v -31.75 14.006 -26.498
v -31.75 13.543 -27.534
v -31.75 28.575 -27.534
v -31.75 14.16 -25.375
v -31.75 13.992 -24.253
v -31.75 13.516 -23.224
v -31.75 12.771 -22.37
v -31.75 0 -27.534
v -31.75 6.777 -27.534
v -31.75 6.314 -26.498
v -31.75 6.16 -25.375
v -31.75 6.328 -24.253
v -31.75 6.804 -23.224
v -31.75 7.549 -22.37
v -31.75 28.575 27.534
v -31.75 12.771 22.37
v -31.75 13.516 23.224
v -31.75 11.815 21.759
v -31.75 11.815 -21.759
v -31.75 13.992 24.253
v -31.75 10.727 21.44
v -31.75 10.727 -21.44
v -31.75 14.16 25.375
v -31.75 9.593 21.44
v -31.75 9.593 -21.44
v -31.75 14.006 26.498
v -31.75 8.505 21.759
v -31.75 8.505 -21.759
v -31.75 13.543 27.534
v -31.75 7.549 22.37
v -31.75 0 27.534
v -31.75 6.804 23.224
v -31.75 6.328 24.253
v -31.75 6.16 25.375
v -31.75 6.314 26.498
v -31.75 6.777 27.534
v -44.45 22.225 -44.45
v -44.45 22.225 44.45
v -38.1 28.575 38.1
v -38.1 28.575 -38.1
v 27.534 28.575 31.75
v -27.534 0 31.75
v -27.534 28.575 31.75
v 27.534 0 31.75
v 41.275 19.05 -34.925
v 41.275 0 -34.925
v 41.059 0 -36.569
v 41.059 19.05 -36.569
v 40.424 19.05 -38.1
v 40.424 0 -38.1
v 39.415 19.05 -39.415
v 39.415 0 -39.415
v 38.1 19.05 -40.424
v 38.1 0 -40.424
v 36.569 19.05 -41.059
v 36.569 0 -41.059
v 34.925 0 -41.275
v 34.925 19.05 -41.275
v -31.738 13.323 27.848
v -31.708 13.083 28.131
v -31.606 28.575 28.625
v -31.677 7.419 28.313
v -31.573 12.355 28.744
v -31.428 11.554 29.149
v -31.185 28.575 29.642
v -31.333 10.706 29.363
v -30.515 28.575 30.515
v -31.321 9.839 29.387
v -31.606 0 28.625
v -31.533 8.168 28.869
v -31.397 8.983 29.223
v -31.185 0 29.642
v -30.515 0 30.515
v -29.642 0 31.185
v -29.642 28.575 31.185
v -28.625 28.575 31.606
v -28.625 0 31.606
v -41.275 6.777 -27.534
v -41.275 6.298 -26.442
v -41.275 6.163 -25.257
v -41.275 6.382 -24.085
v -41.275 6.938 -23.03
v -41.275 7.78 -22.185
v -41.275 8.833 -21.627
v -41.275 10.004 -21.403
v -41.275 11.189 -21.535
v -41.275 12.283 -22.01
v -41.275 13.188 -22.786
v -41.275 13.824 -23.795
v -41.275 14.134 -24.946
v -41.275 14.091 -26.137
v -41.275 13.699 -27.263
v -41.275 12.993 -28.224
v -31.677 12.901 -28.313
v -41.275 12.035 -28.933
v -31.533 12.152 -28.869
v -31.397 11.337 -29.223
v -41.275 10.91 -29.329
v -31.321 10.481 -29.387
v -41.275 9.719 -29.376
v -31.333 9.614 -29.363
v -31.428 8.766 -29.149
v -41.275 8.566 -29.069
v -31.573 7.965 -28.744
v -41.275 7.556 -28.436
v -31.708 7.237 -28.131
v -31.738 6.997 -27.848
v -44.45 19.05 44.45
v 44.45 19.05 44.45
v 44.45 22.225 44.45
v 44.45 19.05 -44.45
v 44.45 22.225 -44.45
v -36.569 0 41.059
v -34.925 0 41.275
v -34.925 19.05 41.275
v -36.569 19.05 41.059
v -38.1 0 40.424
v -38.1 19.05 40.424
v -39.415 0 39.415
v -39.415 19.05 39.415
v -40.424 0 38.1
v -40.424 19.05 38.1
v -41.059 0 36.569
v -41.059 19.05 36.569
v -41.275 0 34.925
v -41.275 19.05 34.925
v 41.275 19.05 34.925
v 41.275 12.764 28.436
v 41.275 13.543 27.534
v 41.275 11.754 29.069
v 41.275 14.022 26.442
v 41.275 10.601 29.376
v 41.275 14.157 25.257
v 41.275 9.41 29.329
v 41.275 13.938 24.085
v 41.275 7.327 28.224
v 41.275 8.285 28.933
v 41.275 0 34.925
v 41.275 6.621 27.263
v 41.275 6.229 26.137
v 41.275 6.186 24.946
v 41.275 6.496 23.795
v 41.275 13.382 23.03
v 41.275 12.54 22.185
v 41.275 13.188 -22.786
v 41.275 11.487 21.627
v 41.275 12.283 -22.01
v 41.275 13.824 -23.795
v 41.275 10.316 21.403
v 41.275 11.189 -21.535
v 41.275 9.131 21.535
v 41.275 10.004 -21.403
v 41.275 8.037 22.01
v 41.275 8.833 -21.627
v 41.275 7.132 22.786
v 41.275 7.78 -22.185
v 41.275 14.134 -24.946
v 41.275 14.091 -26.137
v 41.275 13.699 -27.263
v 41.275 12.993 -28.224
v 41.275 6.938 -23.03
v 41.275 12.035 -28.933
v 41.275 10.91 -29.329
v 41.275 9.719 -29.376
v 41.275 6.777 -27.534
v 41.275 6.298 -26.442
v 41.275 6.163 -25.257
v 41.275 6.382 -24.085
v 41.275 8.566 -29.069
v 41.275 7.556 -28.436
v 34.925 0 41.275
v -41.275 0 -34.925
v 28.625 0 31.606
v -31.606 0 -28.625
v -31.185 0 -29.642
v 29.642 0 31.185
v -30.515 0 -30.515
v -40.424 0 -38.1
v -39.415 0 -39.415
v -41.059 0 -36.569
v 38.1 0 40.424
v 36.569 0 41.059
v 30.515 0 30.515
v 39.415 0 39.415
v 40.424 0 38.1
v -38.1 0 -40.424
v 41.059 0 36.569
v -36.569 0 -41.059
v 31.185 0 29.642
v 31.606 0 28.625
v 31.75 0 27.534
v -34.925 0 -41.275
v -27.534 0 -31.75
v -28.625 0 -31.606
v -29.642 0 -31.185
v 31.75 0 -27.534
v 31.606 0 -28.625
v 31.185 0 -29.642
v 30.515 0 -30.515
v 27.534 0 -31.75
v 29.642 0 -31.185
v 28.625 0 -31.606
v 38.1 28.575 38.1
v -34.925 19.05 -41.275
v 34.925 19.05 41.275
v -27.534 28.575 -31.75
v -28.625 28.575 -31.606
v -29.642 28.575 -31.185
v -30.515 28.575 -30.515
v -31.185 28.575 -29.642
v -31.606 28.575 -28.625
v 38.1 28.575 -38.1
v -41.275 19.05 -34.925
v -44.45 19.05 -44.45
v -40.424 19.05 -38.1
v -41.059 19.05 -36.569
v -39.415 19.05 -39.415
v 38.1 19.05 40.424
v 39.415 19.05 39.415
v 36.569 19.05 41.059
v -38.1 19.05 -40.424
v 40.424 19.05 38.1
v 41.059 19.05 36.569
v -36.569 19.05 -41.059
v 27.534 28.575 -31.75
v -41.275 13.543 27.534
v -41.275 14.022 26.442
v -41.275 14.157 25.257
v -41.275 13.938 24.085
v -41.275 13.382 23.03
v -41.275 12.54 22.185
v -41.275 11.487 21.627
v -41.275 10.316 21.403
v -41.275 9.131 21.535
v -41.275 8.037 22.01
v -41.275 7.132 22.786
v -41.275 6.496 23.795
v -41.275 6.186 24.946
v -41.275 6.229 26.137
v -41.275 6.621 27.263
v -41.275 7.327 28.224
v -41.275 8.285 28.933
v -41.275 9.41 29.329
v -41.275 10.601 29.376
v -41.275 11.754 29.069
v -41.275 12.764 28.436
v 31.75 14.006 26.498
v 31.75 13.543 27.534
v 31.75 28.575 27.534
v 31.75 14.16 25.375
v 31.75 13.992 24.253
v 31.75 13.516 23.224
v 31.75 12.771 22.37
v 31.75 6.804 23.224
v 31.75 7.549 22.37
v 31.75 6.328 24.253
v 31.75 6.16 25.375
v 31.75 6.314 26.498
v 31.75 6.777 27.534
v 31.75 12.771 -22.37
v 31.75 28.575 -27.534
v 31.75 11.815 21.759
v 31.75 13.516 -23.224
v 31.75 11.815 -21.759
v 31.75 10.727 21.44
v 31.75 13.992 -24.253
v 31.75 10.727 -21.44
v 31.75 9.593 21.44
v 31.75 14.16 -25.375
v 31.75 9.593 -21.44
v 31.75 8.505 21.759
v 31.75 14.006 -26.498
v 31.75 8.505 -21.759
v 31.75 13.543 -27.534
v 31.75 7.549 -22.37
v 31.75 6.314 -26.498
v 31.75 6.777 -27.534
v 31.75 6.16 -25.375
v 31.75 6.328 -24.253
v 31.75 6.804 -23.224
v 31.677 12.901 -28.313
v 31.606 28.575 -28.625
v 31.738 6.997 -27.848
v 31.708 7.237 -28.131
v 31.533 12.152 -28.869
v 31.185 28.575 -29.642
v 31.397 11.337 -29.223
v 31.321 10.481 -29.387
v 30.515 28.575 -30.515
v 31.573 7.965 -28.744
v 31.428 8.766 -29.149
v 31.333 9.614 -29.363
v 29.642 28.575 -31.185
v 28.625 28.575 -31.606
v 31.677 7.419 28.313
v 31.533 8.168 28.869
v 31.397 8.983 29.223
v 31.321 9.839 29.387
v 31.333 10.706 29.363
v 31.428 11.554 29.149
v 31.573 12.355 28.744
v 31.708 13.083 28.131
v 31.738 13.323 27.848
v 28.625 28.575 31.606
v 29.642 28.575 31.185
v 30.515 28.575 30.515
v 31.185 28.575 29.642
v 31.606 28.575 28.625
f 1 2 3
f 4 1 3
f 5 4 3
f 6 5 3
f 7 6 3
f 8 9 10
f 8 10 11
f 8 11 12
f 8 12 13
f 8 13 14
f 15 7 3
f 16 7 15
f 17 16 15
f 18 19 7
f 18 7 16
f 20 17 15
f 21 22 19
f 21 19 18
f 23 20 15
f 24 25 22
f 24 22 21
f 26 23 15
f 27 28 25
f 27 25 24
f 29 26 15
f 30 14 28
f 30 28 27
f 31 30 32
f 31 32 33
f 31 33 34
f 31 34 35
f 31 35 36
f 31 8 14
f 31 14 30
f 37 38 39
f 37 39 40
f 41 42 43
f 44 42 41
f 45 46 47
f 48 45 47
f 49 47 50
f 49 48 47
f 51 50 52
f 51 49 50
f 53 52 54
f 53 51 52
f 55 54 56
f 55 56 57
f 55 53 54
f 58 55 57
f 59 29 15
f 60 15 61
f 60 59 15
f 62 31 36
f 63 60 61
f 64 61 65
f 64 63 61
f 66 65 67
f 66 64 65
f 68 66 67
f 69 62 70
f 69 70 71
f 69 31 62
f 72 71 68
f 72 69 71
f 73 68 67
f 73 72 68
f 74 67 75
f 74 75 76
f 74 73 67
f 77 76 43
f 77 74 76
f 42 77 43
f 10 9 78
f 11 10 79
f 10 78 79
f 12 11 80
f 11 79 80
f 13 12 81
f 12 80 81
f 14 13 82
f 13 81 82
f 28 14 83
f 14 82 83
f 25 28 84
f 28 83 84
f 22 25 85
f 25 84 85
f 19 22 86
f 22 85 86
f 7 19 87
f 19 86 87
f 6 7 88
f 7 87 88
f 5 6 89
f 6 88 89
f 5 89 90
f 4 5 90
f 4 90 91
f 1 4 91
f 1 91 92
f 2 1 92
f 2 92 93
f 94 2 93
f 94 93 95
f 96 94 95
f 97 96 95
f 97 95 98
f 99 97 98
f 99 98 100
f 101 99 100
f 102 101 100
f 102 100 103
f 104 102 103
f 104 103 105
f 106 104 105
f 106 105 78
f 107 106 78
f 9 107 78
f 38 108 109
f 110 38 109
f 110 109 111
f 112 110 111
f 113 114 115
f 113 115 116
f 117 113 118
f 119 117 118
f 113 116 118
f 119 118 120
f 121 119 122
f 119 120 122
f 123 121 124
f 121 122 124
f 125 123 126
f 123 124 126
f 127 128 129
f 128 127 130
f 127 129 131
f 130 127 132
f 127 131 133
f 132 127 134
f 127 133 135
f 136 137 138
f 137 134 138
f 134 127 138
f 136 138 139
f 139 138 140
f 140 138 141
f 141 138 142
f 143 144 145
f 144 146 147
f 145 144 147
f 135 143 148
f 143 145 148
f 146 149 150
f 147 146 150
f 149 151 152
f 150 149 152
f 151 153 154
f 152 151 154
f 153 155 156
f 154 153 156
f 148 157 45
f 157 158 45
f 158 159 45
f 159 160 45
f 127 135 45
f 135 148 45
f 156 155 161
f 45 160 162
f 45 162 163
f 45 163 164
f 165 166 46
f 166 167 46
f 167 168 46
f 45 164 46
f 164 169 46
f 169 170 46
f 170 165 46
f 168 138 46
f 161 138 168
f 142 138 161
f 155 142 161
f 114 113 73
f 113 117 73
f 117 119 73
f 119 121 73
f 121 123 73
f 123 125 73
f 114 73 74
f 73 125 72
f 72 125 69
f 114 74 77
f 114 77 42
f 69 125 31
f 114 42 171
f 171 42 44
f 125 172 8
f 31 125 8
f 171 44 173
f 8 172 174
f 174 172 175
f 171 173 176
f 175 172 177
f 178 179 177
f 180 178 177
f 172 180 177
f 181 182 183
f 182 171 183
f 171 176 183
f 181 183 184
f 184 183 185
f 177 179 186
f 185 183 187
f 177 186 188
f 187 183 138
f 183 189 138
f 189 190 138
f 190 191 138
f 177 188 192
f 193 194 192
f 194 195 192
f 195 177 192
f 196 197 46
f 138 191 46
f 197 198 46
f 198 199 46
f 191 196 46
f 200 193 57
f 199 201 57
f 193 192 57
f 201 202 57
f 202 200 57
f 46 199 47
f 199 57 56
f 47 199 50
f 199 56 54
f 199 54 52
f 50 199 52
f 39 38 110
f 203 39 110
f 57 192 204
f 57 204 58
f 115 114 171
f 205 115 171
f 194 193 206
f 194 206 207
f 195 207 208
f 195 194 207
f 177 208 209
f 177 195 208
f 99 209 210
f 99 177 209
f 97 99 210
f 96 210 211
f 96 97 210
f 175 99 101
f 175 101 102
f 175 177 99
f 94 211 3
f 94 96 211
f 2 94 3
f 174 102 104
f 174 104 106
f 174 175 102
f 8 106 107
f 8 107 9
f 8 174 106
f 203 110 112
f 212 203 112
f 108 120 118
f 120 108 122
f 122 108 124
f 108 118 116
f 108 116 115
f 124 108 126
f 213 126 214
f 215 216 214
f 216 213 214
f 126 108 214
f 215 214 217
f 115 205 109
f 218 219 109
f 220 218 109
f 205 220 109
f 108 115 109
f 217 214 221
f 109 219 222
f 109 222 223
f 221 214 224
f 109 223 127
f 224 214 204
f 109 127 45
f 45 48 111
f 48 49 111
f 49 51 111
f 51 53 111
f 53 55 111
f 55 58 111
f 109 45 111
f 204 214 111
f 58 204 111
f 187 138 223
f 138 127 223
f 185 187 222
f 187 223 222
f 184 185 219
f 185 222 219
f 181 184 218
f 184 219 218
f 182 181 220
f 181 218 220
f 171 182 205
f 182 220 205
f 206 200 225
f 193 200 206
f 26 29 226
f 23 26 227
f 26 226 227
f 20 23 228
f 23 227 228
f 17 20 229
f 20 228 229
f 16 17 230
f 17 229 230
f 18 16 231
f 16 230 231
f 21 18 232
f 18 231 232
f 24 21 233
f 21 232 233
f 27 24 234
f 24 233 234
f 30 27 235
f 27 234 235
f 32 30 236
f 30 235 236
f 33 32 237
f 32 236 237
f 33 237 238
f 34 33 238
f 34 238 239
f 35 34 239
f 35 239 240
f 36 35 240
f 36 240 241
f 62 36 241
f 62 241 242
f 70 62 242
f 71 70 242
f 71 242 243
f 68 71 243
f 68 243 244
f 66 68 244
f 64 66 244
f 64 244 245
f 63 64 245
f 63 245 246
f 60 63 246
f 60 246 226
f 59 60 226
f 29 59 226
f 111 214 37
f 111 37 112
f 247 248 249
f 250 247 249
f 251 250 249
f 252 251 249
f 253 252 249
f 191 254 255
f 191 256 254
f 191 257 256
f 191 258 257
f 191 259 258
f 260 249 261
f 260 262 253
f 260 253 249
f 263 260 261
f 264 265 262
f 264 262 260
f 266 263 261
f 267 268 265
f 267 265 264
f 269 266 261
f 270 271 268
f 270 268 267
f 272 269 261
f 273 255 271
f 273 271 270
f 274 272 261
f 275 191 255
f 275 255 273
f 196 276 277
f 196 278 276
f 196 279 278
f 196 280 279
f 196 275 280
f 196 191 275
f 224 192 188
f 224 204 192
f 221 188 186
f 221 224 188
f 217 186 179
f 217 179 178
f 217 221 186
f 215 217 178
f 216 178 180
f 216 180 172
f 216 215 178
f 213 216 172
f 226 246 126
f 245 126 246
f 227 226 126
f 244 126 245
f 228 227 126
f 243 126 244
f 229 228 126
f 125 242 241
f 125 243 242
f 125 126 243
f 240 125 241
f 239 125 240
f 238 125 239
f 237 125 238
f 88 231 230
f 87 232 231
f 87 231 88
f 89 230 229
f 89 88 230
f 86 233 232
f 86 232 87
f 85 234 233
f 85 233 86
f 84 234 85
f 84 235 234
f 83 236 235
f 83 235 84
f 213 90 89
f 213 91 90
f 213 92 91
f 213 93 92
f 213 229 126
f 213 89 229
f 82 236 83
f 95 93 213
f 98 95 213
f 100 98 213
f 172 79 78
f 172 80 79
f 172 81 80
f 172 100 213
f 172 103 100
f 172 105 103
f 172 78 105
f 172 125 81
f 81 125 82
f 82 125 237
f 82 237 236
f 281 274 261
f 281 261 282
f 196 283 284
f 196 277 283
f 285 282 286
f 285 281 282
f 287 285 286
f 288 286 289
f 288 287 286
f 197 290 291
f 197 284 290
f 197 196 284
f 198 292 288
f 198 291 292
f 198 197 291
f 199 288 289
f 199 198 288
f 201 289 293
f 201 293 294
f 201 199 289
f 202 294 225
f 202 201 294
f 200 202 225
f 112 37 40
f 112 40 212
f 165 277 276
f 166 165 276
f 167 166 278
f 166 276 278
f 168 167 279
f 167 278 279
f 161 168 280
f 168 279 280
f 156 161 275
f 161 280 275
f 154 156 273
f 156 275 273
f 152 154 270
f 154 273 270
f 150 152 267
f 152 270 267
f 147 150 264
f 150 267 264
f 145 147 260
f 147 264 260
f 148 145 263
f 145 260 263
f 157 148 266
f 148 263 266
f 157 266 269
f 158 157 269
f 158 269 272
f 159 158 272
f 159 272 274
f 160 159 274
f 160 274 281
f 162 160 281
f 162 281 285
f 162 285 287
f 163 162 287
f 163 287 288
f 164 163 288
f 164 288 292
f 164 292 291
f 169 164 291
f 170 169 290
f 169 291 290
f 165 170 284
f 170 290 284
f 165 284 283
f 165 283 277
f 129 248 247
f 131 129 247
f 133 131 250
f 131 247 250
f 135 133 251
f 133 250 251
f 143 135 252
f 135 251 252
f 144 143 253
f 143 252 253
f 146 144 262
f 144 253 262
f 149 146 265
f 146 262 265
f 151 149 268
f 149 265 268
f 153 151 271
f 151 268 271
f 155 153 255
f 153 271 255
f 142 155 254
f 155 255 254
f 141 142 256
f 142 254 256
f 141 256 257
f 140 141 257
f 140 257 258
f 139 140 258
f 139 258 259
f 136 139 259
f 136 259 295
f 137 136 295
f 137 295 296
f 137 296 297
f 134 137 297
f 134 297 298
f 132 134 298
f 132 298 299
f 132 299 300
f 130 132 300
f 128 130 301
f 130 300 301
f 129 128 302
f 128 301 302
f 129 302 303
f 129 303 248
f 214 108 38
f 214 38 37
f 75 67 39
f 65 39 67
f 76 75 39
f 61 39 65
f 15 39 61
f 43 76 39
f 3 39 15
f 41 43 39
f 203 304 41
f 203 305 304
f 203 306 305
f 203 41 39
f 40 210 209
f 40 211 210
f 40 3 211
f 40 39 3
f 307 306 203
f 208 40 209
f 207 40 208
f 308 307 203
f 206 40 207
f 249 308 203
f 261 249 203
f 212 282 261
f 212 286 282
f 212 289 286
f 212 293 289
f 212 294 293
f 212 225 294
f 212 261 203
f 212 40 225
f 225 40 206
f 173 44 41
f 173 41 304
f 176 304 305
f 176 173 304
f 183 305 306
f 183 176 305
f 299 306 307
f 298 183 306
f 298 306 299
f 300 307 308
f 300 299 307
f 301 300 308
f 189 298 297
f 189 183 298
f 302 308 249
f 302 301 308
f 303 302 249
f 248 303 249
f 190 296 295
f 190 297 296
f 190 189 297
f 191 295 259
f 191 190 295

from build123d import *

# Parameters (mm, degrees)
SKETCH1_W           = 82.55
SKETCH1_H           = 82.55
BOSS_EXTRUDE1_DEPTH = 19.05
BOSS_EXTRUDE2_START = 19.05
SKETCH1_3_W         = 88.9
SKETCH1_3_H         = 88.9
SKETCH1_3_W_2       = 82.55
SKETCH1_3_H_2       = 82.55
BOSS_EXTRUDE2_DEPTH = 9.525
FILLET1_R           = 6.35
CHAMFER1_SIZE       = 6.35
SKETCH2_R           = 4
CUT_EXTRUDE2_DEPTH  = 101.703072197


with BuildPart() as part:
    # Sketch1 → Boss-Extrude1 (new body)
    with BuildSketch(Plane(origin=(0, 0, 0), x_dir=(1, 0, 0), z_dir=(0, 1, 0))):
        Rectangle(SKETCH1_W, SKETCH1_H)
        with BuildLine():
            ThreePointArc((-27.5336, 31.75), (-30.515045032, 30.515045032), (-31.75, 27.5336))
            Line((-31.75, 27.5336), (-31.75, -27.5336))
            ThreePointArc((-31.75, -27.5336), (-30.515045032, -30.515045032), (-27.5336, -31.75))
            Line((-27.5336, -31.75), (27.5336, -31.75))
            ThreePointArc((27.5336, -31.75), (30.515045032, -30.515045032), (31.75, -27.5336))
            Line((31.75, -27.5336), (31.75, 27.5336))
            ThreePointArc((31.75, 27.5336), (30.515045032, 30.515045032), (27.5336, 31.75))
            Line((27.5336, 31.75), (-27.5336, 31.75))
        make_face(mode=Mode.SUBTRACT)
    extrude(amount=BOSS_EXTRUDE1_DEPTH)

    # Sketch1<3> → Boss-Extrude2 (add)
    # profile 1 of 2: a face of its own
    with BuildSketch(Plane(origin=(0, 0, 0), x_dir=(1, 0, 0), z_dir=(0, 1, 0)).offset(BOSS_EXTRUDE2_START)):
        Rectangle(SKETCH1_3_W, SKETCH1_3_H)
        Rectangle(SKETCH1_3_W_2, SKETCH1_3_H_2, mode=Mode.SUBTRACT)
    # profile 2 of 2: a face of its own
    with BuildSketch(Plane(origin=(0, 0, 0), x_dir=(1, 0, 0), z_dir=(0, 1, 0)).offset(BOSS_EXTRUDE2_START)):
        Rectangle(SKETCH1_3_W_2, SKETCH1_3_H_2)
        with BuildLine():
            ThreePointArc((-27.5336, 31.75), (-30.515045032, 30.515045032), (-31.75, 27.5336))
            Line((-31.75, 27.5336), (-31.75, -27.5336))
            ThreePointArc((-31.75, -27.5336), (-30.515045032, -30.515045032), (-27.5336, -31.75))
            Line((-27.5336, -31.75), (27.5336, -31.75))
            ThreePointArc((27.5336, -31.75), (30.515045032, -30.515045032), (31.75, -27.5336))
            Line((31.75, -27.5336), (31.75, 27.5336))
            ThreePointArc((31.75, 27.5336), (30.515045032, 30.515045032), (27.5336, 31.75))
            Line((27.5336, 31.75), (-27.5336, 31.75))
        make_face(mode=Mode.SUBTRACT)
    extrude(amount=BOSS_EXTRUDE2_DEPTH)

    # Fillet1
    fillet1_edges = [part.edges().sort_by_distance(p)[0] for p in [
        (41.275, 9.525, -41.275),
        (41.275, 9.525, 41.275),
        (-41.275, 9.525, 41.275),
        (-41.275, 9.525, -41.275),
    ]]
    fillet(fillet1_edges, radius=FILLET1_R)

    # Chamfer1
    chamfer1_edges = [part.edges().sort_by_distance(p)[0] for p in [
        (44.45, 28.575, 0),
        (0, 28.575, 44.45),
        (0, 28.575, -44.45),
        (-44.45, 28.575, 0),
    ]]
    chamfer(chamfer1_edges, length=CHAMFER1_SIZE)

    # Sketch2 → Cut-Extrude2 (cut, through all)
    with BuildSketch(Plane.ZY.offset(41.275)):
        with Locations(Location((-25.4, 10.16, 0), (0, 0, 237.764531712))):
            Circle(SKETCH2_R)
        with Locations(Location((25.4, 10.16, 0), (0, 0, 57.764531712))):
            Circle(SKETCH2_R)
    extrude(amount=-CUT_EXTRUDE2_DEPTH, mode=Mode.SUBTRACT)


solid = part.part
